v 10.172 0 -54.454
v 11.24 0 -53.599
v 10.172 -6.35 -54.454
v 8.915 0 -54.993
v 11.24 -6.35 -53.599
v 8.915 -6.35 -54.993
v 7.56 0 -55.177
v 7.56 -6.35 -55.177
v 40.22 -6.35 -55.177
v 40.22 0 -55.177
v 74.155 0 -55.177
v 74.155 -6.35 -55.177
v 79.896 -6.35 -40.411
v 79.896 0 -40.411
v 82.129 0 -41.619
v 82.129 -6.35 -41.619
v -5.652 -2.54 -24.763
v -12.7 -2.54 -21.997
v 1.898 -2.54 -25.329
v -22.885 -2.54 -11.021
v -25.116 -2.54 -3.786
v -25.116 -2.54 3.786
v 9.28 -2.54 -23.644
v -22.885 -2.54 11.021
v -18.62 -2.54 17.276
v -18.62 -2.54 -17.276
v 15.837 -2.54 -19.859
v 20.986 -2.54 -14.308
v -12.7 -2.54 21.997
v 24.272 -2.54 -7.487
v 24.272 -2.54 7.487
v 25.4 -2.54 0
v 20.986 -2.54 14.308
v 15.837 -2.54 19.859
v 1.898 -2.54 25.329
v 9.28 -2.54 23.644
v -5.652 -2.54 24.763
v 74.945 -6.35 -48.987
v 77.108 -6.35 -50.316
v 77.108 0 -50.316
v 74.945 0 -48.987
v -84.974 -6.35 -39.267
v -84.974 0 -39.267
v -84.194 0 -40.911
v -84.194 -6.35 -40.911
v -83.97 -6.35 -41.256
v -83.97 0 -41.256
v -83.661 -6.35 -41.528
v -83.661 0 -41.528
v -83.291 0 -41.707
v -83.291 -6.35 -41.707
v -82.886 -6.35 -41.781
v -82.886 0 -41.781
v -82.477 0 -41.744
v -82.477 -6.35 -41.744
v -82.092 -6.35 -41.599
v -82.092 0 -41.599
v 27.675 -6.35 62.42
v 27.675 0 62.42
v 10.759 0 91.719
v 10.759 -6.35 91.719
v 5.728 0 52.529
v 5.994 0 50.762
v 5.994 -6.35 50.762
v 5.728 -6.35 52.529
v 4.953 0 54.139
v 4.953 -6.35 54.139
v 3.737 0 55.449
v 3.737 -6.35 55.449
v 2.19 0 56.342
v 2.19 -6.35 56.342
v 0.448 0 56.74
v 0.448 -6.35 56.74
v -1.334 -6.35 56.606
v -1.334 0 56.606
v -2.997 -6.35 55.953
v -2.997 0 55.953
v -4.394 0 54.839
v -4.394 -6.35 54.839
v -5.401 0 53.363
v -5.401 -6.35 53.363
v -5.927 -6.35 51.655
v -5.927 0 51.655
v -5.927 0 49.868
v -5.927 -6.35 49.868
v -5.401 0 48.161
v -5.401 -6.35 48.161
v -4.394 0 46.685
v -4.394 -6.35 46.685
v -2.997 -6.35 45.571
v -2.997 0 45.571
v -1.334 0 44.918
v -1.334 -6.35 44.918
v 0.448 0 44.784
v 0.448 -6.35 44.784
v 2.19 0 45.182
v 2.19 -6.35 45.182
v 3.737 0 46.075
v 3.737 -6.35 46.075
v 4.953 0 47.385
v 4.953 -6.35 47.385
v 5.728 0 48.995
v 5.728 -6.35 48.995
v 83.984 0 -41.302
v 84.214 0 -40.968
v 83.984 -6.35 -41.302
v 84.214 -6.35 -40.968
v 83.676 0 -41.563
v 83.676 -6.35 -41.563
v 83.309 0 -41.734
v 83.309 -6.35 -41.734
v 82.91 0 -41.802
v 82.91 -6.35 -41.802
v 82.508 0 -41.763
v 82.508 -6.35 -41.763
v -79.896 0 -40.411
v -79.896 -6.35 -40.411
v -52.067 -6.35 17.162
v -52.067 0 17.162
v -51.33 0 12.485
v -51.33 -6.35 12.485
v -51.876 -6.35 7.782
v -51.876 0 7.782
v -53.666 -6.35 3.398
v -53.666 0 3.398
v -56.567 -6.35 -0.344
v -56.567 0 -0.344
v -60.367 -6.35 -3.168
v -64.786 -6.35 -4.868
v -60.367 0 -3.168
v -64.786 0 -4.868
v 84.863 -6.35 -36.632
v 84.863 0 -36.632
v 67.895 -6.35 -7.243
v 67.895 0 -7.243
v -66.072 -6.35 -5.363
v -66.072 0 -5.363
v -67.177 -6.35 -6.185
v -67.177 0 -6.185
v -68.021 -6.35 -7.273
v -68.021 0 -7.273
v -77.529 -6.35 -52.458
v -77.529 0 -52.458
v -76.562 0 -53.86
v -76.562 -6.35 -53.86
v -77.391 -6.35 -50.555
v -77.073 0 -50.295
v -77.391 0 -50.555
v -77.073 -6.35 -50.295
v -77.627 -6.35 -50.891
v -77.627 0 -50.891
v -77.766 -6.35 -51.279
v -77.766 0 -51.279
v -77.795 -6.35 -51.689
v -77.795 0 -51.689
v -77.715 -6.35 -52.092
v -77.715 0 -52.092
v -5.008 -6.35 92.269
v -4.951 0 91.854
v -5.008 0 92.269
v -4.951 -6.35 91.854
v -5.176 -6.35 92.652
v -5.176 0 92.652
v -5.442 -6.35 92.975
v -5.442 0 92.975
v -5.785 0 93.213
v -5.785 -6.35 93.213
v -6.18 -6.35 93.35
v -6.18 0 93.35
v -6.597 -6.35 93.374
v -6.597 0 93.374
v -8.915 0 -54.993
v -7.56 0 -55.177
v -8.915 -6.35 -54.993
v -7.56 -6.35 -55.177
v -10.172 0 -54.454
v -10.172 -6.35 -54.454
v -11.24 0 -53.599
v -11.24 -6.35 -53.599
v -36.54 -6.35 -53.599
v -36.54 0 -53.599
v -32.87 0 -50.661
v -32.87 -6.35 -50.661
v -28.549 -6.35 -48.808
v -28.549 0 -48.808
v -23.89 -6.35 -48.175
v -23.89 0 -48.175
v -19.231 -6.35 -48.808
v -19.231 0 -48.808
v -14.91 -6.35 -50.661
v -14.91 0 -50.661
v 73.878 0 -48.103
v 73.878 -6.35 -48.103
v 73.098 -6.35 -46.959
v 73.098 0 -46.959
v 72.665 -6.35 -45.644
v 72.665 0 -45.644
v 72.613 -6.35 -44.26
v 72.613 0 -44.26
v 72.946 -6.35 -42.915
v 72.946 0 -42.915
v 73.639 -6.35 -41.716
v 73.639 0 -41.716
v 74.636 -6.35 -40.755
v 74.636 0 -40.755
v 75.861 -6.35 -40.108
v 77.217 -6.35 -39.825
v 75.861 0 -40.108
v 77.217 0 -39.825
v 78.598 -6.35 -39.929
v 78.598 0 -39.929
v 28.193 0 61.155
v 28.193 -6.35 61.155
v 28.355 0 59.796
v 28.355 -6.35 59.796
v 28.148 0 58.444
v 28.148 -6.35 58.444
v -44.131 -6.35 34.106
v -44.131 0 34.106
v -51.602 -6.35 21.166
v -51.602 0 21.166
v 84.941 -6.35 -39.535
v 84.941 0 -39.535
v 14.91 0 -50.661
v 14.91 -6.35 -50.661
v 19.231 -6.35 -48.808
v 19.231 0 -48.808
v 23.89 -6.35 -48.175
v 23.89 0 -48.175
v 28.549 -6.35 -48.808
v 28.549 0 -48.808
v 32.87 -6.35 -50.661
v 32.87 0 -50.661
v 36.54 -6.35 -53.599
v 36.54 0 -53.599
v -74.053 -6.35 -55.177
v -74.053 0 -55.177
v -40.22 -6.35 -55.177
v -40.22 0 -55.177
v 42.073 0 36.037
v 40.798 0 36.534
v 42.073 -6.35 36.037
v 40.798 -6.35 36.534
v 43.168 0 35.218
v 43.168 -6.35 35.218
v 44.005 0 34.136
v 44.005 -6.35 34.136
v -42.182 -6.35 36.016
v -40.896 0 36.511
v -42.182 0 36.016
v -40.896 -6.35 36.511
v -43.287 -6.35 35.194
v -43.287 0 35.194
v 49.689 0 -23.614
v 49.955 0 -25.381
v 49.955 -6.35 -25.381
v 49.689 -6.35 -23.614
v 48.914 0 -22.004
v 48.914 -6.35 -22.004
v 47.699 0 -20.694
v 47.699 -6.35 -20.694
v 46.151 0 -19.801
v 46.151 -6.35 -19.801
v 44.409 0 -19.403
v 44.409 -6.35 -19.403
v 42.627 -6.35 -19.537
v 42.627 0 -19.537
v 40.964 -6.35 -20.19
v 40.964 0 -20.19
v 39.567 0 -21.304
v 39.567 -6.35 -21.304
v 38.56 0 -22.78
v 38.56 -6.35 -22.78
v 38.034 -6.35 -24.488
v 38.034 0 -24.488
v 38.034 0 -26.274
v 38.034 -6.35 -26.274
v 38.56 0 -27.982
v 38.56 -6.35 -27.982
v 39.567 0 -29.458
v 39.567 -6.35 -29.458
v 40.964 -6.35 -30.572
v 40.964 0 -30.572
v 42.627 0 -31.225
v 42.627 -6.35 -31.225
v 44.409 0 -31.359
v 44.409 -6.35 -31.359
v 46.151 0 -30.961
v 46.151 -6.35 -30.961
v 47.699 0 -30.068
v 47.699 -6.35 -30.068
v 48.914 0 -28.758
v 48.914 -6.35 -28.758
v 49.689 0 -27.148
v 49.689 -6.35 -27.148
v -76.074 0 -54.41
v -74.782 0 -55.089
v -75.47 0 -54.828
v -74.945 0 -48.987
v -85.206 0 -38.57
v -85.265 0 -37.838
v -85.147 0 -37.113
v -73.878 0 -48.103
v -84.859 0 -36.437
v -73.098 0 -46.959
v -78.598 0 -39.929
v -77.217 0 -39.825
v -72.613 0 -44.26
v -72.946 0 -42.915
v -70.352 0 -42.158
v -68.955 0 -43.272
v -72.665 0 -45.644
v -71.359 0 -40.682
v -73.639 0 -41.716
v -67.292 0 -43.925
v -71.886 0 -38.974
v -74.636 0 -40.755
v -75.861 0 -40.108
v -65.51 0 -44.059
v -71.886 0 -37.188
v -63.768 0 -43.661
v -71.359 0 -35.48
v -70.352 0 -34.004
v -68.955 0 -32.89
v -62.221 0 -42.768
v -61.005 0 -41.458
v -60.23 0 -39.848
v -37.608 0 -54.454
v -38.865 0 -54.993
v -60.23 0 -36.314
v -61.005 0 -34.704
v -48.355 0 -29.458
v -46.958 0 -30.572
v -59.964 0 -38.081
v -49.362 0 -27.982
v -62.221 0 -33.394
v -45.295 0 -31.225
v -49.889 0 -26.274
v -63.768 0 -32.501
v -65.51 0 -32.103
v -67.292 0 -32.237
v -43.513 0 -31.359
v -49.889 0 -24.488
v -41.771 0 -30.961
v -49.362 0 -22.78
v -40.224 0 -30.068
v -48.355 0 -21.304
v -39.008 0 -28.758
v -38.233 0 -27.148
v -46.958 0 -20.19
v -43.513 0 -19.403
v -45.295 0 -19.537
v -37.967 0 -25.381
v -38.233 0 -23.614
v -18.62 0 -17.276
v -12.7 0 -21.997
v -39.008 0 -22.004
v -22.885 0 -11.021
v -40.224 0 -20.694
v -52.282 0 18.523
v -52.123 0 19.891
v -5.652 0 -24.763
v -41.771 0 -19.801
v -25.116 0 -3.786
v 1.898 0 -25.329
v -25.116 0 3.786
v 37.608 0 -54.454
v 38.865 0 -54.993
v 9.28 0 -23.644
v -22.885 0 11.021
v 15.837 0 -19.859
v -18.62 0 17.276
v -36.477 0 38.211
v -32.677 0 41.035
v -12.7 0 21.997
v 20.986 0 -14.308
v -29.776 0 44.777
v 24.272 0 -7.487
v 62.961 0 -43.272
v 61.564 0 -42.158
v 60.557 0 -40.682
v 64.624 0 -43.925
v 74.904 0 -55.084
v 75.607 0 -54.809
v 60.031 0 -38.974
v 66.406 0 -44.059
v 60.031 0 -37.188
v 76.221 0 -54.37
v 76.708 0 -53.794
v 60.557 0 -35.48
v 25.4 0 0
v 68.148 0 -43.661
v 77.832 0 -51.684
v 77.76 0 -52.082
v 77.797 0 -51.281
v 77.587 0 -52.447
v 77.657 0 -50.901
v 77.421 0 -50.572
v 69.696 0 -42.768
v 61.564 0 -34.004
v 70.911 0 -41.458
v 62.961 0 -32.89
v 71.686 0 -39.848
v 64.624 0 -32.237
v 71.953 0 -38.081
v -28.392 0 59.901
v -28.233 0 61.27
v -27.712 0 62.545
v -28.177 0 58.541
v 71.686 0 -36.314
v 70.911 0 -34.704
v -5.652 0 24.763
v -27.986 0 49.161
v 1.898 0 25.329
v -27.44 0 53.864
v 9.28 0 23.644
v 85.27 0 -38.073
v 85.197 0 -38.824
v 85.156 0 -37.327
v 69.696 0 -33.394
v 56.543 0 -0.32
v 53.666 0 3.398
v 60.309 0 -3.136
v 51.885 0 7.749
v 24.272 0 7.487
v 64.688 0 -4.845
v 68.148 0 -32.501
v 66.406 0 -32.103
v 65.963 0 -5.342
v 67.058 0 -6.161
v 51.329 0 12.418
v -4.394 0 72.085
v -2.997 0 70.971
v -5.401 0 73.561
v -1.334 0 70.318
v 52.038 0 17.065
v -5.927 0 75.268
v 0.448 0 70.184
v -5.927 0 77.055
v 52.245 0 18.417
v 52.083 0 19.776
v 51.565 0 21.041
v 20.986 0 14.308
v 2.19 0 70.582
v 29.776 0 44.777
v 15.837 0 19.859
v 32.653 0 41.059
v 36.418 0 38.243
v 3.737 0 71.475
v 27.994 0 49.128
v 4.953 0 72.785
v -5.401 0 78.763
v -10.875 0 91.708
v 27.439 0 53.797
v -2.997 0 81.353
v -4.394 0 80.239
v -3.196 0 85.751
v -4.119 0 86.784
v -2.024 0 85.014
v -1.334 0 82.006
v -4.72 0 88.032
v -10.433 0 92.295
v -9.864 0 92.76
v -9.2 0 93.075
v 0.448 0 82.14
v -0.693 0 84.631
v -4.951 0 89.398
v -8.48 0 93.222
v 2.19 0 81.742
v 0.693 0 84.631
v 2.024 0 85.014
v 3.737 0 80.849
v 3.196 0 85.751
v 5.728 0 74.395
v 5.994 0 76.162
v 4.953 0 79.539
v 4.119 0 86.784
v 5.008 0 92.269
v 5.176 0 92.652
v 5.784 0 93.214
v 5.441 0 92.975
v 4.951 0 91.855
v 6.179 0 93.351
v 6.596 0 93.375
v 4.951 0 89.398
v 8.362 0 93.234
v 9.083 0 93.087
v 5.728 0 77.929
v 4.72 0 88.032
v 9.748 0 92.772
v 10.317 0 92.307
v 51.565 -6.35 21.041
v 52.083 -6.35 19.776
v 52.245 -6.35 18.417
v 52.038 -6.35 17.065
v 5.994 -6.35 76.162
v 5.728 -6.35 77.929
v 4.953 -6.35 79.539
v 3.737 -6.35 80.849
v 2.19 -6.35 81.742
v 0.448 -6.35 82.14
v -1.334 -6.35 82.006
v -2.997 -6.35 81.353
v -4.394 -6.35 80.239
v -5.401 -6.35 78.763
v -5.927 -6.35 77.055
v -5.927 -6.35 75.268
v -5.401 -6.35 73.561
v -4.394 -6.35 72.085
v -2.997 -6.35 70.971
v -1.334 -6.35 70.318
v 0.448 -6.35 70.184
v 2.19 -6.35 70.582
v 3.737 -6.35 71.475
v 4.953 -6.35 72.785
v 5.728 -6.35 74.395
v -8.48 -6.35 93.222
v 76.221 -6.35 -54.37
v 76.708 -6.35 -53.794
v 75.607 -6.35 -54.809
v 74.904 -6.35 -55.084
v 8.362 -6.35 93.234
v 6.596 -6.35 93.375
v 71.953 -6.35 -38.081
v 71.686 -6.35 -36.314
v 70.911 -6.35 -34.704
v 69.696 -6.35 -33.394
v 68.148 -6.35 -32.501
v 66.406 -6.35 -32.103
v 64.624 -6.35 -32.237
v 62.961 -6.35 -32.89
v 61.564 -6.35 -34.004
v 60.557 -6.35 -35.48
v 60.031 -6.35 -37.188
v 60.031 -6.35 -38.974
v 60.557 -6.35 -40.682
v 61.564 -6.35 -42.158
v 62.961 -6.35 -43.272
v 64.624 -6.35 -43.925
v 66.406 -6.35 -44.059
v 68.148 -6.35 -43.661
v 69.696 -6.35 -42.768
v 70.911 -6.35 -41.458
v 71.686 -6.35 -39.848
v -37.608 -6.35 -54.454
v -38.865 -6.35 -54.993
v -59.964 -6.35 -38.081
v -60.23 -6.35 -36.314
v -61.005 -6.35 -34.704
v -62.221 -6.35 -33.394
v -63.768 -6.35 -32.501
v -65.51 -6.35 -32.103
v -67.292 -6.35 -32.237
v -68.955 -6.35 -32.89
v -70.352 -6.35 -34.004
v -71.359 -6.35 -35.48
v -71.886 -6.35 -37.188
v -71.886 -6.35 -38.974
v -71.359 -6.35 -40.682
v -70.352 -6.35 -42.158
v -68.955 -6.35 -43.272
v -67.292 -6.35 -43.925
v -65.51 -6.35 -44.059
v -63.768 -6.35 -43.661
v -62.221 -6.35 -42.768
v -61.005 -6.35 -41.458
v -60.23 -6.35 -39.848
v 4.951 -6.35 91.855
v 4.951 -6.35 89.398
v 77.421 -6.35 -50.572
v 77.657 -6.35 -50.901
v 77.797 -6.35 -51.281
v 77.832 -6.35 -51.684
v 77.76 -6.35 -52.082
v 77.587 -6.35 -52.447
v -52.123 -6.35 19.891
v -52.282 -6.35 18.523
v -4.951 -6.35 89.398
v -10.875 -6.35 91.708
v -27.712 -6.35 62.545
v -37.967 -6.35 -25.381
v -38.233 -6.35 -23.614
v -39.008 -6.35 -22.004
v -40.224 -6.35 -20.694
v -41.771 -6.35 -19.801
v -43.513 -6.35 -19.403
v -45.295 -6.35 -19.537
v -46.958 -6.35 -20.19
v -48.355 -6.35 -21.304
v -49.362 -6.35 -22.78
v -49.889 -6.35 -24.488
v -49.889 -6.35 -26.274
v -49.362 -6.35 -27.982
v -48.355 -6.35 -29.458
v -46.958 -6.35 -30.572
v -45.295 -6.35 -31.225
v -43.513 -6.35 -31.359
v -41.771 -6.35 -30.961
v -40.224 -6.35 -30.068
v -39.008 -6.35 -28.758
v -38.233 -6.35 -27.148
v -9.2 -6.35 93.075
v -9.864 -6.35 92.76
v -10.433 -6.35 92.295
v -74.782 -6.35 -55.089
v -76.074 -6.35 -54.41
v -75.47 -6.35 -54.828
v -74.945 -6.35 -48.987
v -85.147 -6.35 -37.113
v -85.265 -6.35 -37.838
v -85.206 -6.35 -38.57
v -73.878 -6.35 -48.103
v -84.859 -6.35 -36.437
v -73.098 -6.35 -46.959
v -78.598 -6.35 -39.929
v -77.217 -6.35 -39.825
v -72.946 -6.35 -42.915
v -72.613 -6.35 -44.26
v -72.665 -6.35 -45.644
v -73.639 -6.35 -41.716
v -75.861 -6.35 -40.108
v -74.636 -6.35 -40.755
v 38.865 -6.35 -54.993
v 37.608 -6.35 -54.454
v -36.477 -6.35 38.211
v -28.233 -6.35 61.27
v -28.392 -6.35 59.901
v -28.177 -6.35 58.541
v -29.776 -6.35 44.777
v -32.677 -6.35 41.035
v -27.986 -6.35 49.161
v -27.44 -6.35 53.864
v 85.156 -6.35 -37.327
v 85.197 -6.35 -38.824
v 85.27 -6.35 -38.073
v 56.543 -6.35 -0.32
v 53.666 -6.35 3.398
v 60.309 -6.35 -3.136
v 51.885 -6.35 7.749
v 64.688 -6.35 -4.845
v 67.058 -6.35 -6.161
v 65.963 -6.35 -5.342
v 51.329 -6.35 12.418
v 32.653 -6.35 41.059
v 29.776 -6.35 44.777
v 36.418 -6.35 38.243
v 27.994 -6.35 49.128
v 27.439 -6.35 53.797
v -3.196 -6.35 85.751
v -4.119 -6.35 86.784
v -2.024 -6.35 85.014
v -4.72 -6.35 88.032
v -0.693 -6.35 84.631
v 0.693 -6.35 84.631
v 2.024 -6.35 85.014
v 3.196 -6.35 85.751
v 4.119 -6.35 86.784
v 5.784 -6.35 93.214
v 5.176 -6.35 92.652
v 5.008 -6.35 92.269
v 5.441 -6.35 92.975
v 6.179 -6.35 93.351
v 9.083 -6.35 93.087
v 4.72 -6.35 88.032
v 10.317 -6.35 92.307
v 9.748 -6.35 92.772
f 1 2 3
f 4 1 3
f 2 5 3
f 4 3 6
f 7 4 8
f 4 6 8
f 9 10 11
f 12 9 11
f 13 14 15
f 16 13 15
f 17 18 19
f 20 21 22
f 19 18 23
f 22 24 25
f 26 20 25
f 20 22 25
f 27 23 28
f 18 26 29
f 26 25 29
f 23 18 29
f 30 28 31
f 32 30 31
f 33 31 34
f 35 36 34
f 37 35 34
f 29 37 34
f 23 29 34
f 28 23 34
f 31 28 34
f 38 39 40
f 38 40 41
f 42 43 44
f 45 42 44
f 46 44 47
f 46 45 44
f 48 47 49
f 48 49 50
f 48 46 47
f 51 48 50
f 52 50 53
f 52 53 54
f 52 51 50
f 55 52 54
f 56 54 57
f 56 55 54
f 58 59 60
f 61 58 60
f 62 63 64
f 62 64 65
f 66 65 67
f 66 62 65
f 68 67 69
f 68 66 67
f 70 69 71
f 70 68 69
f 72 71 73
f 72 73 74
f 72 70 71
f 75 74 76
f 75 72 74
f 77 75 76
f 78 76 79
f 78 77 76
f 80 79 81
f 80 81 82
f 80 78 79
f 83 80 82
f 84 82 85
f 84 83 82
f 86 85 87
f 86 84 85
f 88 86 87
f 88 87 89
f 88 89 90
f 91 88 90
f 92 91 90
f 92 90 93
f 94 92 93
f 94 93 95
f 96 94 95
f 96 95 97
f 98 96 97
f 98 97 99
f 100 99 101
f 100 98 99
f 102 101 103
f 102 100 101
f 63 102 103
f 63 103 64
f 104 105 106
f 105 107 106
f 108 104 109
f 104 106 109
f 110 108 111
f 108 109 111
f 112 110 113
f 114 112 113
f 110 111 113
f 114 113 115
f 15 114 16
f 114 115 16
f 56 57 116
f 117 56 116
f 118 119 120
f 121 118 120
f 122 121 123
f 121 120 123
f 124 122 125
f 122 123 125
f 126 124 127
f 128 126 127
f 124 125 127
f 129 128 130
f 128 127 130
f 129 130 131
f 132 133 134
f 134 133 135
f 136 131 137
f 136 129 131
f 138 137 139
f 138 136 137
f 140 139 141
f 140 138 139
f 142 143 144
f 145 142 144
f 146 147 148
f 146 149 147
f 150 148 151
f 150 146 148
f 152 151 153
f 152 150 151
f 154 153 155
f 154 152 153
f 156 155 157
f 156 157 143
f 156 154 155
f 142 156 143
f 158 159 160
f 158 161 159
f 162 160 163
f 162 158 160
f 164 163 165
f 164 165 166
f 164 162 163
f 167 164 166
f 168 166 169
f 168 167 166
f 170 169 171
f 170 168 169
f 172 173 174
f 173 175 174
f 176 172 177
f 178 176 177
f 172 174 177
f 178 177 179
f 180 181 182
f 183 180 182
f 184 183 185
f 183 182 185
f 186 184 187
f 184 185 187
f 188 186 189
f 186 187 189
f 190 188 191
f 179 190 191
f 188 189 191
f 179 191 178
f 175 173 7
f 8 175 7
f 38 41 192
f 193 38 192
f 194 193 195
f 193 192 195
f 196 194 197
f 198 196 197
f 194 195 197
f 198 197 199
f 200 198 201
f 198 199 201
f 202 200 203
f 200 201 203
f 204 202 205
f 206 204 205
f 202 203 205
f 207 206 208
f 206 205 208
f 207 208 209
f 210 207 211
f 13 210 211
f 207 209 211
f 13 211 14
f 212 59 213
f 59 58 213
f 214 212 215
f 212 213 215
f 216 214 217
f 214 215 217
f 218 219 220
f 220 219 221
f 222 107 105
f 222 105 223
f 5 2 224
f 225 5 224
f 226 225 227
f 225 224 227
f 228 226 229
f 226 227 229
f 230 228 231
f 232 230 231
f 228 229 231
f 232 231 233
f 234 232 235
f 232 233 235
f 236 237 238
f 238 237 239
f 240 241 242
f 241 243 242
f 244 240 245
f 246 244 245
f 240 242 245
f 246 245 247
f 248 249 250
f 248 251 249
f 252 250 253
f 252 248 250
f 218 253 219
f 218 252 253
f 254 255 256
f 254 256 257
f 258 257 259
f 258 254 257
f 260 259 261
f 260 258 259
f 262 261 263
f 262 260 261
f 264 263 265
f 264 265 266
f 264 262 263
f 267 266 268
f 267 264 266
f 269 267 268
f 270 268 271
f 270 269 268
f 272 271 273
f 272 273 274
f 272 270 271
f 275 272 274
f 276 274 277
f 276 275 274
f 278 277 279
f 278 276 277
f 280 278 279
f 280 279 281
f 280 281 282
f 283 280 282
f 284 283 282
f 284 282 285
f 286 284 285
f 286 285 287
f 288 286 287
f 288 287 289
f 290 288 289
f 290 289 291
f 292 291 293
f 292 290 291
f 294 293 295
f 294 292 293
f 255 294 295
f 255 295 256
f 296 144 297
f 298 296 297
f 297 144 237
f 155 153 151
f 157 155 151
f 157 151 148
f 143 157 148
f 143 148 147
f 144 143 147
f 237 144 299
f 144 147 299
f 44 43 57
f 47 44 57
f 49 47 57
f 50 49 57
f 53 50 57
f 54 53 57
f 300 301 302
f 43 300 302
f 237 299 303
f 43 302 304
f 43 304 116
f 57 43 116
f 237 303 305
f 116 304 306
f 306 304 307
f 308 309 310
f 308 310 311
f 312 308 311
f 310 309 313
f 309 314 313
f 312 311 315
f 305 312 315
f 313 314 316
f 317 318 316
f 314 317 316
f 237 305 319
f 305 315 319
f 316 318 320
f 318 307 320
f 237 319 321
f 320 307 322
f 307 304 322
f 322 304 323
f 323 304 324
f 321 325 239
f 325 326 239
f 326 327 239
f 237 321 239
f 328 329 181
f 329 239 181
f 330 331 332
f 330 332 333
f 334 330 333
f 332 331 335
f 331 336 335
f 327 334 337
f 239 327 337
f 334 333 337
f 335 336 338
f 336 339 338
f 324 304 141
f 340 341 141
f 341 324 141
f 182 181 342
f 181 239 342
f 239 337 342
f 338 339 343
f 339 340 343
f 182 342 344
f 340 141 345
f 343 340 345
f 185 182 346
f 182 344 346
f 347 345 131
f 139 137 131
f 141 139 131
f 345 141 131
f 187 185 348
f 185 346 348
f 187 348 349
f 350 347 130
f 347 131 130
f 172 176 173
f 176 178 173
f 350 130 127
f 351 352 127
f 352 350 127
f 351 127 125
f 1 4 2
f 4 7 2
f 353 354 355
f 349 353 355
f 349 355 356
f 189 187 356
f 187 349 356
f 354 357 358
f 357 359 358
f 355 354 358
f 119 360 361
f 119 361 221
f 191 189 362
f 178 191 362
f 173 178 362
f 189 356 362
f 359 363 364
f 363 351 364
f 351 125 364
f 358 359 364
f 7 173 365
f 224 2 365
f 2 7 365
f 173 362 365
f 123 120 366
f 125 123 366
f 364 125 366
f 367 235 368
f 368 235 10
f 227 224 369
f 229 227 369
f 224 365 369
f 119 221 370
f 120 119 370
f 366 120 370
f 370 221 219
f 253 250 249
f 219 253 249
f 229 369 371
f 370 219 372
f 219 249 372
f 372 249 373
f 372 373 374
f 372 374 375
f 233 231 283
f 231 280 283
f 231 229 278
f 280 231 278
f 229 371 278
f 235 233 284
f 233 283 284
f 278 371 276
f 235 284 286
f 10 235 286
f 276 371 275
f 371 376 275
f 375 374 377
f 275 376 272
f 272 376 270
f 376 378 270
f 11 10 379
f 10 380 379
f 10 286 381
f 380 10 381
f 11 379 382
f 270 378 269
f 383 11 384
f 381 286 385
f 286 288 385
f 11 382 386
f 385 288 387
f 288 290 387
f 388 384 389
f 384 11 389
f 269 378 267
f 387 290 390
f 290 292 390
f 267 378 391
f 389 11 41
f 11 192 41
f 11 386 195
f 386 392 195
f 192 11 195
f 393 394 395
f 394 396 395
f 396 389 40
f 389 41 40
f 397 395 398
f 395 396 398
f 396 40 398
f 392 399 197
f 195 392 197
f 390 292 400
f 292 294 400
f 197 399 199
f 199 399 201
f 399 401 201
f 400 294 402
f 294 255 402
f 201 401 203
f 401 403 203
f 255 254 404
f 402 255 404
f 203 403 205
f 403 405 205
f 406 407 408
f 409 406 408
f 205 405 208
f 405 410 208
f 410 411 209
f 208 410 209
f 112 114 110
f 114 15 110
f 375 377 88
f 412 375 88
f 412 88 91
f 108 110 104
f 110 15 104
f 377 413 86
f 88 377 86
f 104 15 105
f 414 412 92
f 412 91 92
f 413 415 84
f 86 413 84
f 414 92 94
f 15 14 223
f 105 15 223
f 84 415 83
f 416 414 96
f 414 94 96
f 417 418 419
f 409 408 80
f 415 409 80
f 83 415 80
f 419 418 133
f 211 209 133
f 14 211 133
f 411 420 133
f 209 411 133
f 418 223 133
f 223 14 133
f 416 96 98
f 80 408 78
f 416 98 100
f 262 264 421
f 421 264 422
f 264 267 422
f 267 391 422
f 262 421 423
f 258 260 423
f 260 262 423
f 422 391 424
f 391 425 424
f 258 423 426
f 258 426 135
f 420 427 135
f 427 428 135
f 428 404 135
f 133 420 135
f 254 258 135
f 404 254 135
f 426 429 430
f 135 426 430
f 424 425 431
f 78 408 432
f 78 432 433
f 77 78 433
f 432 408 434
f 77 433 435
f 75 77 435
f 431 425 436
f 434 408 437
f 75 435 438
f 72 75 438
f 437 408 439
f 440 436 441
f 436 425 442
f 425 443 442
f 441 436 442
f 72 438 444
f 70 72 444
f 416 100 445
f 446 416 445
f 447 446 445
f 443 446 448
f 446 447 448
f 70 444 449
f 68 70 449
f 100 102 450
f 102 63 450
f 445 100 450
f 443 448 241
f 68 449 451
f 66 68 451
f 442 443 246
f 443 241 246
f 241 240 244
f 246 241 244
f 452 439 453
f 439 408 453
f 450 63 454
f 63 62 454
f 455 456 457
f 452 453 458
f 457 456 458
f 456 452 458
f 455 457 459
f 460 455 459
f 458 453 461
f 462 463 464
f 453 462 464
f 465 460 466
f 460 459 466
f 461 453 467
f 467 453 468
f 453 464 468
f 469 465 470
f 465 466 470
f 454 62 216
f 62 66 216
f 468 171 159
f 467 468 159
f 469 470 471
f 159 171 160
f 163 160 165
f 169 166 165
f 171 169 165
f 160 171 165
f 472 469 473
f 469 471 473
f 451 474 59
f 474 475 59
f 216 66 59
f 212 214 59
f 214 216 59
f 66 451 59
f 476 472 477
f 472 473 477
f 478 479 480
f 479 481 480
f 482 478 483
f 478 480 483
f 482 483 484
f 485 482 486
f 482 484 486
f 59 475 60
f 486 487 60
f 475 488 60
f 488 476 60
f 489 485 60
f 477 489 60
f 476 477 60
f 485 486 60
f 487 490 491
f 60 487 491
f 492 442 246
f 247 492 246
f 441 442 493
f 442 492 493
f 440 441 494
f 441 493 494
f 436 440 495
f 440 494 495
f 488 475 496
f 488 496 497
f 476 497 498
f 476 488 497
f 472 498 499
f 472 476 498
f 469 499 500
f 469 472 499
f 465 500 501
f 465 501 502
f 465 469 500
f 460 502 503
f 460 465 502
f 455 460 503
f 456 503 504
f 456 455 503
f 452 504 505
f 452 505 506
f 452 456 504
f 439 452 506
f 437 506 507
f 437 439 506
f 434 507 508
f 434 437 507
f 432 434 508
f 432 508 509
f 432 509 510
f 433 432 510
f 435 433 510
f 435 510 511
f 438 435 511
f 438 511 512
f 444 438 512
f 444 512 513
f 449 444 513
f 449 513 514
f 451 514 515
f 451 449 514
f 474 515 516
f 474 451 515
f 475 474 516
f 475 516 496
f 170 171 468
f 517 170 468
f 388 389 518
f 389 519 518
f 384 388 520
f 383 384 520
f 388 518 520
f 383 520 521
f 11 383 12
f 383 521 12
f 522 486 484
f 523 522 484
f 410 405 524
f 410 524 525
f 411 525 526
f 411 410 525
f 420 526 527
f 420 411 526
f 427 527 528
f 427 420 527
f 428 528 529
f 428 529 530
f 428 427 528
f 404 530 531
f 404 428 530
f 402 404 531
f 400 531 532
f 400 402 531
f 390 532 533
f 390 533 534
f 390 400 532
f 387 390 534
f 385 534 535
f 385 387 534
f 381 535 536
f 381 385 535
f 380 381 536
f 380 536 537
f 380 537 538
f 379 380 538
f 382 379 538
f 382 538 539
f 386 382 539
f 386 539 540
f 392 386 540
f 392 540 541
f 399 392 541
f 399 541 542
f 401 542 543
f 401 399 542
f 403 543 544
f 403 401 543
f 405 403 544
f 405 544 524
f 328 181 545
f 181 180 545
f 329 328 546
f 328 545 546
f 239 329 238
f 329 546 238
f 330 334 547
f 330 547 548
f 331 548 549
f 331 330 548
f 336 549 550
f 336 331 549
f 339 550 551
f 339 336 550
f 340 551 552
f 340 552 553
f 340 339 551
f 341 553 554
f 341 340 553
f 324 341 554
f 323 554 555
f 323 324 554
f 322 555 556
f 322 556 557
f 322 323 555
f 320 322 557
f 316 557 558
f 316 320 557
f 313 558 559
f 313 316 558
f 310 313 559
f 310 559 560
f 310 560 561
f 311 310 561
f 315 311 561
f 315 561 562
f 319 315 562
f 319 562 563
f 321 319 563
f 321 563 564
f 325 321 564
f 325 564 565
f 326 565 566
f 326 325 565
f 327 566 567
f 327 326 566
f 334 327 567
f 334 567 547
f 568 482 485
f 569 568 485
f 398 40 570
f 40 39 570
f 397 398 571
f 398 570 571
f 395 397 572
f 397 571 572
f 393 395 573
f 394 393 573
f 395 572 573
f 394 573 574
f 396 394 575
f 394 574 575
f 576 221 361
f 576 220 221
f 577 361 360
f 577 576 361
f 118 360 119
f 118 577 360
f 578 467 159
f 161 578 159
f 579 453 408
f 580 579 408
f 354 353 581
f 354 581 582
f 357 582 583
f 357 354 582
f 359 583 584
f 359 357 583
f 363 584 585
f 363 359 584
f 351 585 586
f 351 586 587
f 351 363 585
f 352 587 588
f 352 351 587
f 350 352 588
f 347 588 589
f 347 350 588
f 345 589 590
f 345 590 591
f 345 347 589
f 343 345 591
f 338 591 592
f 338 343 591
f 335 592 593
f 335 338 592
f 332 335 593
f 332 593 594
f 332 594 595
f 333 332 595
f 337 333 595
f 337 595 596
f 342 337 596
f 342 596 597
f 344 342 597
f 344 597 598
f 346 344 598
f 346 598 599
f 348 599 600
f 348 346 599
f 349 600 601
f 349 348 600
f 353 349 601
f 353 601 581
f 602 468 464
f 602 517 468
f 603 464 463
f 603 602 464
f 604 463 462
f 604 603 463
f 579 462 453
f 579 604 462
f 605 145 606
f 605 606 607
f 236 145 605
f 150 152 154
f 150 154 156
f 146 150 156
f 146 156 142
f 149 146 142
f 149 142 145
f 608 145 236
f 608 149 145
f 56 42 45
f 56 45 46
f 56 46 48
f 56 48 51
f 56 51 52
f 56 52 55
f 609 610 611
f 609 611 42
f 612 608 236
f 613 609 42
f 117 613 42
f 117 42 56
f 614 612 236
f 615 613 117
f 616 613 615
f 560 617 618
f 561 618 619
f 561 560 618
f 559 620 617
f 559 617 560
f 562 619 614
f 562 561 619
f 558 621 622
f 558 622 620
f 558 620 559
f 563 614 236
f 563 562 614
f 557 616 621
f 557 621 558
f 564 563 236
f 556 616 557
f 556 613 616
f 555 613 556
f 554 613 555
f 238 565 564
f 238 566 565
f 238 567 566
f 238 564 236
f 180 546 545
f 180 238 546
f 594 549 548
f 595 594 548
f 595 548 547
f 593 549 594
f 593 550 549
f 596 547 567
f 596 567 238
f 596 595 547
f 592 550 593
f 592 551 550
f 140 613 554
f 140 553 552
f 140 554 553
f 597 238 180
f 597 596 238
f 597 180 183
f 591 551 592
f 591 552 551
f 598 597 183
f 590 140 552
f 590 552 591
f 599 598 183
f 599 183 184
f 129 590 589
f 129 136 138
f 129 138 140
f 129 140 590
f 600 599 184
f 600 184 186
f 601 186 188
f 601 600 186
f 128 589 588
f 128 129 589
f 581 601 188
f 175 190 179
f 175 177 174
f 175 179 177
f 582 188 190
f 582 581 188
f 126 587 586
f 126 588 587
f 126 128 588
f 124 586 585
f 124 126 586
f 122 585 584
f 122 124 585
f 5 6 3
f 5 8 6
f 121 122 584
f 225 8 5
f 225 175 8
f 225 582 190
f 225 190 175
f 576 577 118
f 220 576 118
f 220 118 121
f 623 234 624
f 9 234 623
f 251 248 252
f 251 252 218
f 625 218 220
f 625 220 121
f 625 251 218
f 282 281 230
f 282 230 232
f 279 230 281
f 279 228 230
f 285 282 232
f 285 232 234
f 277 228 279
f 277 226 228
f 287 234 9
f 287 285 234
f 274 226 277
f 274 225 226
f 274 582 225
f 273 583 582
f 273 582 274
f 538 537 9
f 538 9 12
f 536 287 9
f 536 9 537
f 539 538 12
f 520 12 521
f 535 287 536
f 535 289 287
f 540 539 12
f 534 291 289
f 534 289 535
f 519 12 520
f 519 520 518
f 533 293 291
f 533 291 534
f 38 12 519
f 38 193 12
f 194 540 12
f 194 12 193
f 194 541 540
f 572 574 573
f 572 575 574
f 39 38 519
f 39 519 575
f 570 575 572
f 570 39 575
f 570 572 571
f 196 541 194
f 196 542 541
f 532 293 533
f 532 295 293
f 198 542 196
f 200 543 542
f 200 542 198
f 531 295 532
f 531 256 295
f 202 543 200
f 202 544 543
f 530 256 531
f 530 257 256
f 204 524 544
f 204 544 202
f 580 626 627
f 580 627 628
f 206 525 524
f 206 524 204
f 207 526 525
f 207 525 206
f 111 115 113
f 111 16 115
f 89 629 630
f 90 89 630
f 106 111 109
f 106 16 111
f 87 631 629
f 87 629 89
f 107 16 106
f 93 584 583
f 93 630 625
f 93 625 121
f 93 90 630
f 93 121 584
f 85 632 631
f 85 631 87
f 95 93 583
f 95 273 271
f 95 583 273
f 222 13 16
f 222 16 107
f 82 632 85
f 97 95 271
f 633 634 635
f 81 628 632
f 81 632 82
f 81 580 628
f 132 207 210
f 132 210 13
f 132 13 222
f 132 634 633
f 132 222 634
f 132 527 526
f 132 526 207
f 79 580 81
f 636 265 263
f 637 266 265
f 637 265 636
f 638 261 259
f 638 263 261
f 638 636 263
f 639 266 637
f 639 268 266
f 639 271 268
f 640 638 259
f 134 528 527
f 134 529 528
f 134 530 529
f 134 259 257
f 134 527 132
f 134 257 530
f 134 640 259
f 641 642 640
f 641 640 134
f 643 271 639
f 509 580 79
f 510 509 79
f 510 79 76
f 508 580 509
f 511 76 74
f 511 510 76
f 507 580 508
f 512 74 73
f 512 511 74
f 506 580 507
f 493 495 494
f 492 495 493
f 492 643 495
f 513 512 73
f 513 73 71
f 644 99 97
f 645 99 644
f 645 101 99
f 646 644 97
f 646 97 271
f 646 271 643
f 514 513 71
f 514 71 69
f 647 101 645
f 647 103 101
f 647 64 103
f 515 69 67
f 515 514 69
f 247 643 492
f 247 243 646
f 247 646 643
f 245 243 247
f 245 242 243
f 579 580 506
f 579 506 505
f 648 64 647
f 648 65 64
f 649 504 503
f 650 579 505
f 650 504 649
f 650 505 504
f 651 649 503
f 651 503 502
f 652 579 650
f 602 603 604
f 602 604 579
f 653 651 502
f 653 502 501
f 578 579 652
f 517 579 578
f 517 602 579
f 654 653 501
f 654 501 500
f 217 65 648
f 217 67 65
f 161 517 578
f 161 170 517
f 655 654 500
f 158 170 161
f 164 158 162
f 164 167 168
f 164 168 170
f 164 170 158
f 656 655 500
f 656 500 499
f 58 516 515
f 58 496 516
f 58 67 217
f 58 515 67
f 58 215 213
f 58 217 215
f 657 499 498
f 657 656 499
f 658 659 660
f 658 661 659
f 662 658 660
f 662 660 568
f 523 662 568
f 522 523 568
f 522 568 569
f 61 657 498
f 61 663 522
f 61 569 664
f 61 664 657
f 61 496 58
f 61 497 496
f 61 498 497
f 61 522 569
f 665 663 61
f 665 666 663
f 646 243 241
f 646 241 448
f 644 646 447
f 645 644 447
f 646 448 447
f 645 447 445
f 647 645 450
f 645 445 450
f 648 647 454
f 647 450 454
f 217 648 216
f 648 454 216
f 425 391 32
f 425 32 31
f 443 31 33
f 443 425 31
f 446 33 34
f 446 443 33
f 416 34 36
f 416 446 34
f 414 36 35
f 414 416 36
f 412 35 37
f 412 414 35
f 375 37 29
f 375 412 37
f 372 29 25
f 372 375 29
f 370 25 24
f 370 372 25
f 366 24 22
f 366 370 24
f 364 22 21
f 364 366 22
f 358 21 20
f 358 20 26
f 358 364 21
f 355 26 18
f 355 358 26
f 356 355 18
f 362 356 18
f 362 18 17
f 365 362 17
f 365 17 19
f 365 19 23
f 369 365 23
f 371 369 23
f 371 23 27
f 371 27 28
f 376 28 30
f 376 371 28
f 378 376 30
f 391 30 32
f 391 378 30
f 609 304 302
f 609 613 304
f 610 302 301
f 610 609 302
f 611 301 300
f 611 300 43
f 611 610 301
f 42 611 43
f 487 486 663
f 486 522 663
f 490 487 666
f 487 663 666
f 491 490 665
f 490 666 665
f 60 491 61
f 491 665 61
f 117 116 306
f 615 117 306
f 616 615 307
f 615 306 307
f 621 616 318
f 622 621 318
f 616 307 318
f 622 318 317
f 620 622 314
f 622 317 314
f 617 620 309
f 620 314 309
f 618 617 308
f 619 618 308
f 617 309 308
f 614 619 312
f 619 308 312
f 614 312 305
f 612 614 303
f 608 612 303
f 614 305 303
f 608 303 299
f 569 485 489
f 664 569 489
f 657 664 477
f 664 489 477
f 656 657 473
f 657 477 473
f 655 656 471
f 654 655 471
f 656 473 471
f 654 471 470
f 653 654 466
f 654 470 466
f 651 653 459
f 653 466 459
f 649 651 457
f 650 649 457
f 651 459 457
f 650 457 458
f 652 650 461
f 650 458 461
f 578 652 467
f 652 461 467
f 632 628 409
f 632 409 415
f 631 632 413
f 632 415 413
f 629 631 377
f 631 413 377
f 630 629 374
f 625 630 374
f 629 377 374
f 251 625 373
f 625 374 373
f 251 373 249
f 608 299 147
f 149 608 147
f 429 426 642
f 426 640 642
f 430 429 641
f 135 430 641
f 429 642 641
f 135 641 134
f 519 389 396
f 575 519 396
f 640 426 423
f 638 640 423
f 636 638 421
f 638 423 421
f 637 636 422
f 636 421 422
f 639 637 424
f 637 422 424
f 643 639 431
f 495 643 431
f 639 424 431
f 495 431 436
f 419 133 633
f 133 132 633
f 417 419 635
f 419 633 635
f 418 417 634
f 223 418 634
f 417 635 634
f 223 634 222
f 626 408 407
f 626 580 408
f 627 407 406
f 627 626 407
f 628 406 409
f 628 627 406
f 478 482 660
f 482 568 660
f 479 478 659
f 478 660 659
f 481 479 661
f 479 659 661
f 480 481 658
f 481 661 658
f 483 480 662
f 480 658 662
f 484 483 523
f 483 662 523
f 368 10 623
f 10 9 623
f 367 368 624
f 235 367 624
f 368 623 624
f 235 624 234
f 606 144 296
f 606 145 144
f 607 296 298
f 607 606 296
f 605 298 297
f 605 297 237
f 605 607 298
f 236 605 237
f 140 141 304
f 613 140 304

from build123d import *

# Parameters (mm, degrees)
F0_R     = 5.9944
F0_R_2   = 25.4
F1_DEPTH = 6.35
F2_DEPTH = 2.54
F3_R     = 1.524
F4_R     = 3.048
F5_R     = 5.08


with BuildPart() as f1:
    # F0 (on Front) → F1 (new body)
    with BuildSketch(Plane.XZ):
        with BuildLine():
            ThreePointArc((4.951105, 89.398002), (0, 84.582), (-4.951105, 89.398002))
            Line((-4.951105, 89.398002), (-4.951105, 93.506112))
            Line((-4.951105, 93.506112), (-10.074773, 93.093531))
            Line((-10.074773, 93.093531), (-28.89515, 60.495681))
            ThreePointArc((-28.89515, 60.495681), (-29.775746, 44.776954), (-42.948265, 36.154973))
            Line((-42.948265, 36.154973), (-52.785257, 19.116802))
            ThreePointArc((-52.785257, 19.116802), (-53.665853, 3.398075), (-66.838372, -5.223907))
            Line((-66.838372, -5.223907), (-85.658749, -37.821756))
            Line((-85.658749, -37.821756), (-83.505709, -42.363937))
            Line((-83.505709, -42.363937), (-79.896493, -40.411218))
            ThreePointArc((-79.896493, -40.411218), (-73.250161, -42.291), (-74.945388, -48.986784))
            Line((-74.945388, -48.986784), (-78.4411, -51.136097))
            Line((-78.4411, -51.136097), (-75.652926, -55.177362))
            Line((-75.652926, -55.177362), (-37.87309, -55.177362))
            ThreePointArc((-37.87309, -55.177362), (-23.890107, -48.17503), (-9.907124, -55.177362))
            Line((-9.907124, -55.177362), (9.907124, -55.177362))
            ThreePointArc((9.907124, -55.177362), (23.890107, -48.17503), (37.87309, -55.177362))
            Line((37.87309, -55.177362), (75.806581, -55.177362))
            Line((75.806581, -55.177362), (78.4411, -51.136097))
            Line((78.4411, -51.136097), (74.945388, -48.986784))
            ThreePointArc((74.945388, -48.986784), (73.250161, -42.291), (79.896493, -40.411218))
            Line((79.896493, -40.411218), (83.505709, -42.363937))
            Line((83.505709, -42.363937), (85.688288, -38.061744))
            Line((85.688288, -38.061744), (66.721542, -5.210377))
            ThreePointArc((66.721542, -5.210377), (53.665853, 3.398075), (52.73856, 19.00886))
            Line((52.73856, 19.00886), (42.831435, 36.168502))
            ThreePointArc((42.831435, 36.168502), (29.775746, 44.776954), (28.848452, 60.387739))
            Line((28.848452, 60.387739), (9.958534, 93.106037))
            Line((9.958534, 93.106037), (4.951105, 93.506112))
            Line((4.951105, 93.506112), (4.951105, 89.398002))
        make_face()
        with Locations((-65.95814, -38.08095)):
            Circle(F0_R, mode=Mode.SUBTRACT)
        with Locations((-43.961095, -25.38095)):
            Circle(F0_R, mode=Mode.SUBTRACT)
        Circle(F0_R_2, mode=Mode.SUBTRACT)
        with Locations((65.95814, -38.08095)):
            Circle(F0_R, mode=Mode.SUBTRACT)
        with Locations((43.961095, -25.38095)):
            Circle(F0_R, mode=Mode.SUBTRACT)
        with Locations((0, 50.7619)):
            Circle(F0_R, mode=Mode.SUBTRACT)
        with Locations((0, 76.1619)):
            Circle(F0_R, mode=Mode.SUBTRACT)
        Circle(F0_R_2)
    extrude(amount=F1_DEPTH)

    # F0 (on Front) → F2 (cut)
    with BuildSketch(Plane.XZ):
        Circle(F0_R_2)
    extrude(amount=F2_DEPTH, mode=Mode.SUBTRACT)

    # F3
    f3_edges = [f1.edges().sort_by_distance(p)[0] for p in [
        (83.505709, -3.175, -42.363937),
        (78.4411, -3.175, -51.136097),
        (4.951105, -3.175, 93.506112),
        (-4.951105, -3.175, 93.506112),
        (-83.505709, -3.175, -42.363937),
        (-78.4411, -3.175, -51.136097),
    ]]
    fillet(f3_edges, radius=F3_R)

    # F4
    f4_edges = [f1.edges().sort_by_distance(p)[0] for p in [
        (-85.658749, -3.175, -37.821756),
        (-75.652926, -3.175, -55.177362),
        (75.806581, -3.175, -55.177362),
        (85.688288, -3.175, -38.061744),
        (9.958534, -3.175, 93.106037),
        (-10.074773, -3.175, 93.093531),
    ]]
    fillet(f4_edges, radius=F4_R)

    # F5
    f5_edges = [f1.edges().sort_by_distance(p)[0] for p in [
        (28.848452, -3.175, 60.387739),
        (42.831435, -3.175, 36.168502),
        (52.73856, -3.175, 19.00886),
        (66.721542, -3.175, -5.210377),
        (37.87309, -3.175, -55.177362),
        (9.907124, -3.175, -55.177362),
        (-9.907124, -3.175, -55.177362),
        (-37.87309, -3.175, -55.177362),
        (-66.838372, -3.175, -5.223907),
        (-52.785257, -3.175, 19.116802),
        (-42.948265, -3.175, 36.154973),
        (-28.89515, -3.175, 60.495681),
    ]]
    fillet(f5_edges, radius=F5_R)


solid = f1.part
